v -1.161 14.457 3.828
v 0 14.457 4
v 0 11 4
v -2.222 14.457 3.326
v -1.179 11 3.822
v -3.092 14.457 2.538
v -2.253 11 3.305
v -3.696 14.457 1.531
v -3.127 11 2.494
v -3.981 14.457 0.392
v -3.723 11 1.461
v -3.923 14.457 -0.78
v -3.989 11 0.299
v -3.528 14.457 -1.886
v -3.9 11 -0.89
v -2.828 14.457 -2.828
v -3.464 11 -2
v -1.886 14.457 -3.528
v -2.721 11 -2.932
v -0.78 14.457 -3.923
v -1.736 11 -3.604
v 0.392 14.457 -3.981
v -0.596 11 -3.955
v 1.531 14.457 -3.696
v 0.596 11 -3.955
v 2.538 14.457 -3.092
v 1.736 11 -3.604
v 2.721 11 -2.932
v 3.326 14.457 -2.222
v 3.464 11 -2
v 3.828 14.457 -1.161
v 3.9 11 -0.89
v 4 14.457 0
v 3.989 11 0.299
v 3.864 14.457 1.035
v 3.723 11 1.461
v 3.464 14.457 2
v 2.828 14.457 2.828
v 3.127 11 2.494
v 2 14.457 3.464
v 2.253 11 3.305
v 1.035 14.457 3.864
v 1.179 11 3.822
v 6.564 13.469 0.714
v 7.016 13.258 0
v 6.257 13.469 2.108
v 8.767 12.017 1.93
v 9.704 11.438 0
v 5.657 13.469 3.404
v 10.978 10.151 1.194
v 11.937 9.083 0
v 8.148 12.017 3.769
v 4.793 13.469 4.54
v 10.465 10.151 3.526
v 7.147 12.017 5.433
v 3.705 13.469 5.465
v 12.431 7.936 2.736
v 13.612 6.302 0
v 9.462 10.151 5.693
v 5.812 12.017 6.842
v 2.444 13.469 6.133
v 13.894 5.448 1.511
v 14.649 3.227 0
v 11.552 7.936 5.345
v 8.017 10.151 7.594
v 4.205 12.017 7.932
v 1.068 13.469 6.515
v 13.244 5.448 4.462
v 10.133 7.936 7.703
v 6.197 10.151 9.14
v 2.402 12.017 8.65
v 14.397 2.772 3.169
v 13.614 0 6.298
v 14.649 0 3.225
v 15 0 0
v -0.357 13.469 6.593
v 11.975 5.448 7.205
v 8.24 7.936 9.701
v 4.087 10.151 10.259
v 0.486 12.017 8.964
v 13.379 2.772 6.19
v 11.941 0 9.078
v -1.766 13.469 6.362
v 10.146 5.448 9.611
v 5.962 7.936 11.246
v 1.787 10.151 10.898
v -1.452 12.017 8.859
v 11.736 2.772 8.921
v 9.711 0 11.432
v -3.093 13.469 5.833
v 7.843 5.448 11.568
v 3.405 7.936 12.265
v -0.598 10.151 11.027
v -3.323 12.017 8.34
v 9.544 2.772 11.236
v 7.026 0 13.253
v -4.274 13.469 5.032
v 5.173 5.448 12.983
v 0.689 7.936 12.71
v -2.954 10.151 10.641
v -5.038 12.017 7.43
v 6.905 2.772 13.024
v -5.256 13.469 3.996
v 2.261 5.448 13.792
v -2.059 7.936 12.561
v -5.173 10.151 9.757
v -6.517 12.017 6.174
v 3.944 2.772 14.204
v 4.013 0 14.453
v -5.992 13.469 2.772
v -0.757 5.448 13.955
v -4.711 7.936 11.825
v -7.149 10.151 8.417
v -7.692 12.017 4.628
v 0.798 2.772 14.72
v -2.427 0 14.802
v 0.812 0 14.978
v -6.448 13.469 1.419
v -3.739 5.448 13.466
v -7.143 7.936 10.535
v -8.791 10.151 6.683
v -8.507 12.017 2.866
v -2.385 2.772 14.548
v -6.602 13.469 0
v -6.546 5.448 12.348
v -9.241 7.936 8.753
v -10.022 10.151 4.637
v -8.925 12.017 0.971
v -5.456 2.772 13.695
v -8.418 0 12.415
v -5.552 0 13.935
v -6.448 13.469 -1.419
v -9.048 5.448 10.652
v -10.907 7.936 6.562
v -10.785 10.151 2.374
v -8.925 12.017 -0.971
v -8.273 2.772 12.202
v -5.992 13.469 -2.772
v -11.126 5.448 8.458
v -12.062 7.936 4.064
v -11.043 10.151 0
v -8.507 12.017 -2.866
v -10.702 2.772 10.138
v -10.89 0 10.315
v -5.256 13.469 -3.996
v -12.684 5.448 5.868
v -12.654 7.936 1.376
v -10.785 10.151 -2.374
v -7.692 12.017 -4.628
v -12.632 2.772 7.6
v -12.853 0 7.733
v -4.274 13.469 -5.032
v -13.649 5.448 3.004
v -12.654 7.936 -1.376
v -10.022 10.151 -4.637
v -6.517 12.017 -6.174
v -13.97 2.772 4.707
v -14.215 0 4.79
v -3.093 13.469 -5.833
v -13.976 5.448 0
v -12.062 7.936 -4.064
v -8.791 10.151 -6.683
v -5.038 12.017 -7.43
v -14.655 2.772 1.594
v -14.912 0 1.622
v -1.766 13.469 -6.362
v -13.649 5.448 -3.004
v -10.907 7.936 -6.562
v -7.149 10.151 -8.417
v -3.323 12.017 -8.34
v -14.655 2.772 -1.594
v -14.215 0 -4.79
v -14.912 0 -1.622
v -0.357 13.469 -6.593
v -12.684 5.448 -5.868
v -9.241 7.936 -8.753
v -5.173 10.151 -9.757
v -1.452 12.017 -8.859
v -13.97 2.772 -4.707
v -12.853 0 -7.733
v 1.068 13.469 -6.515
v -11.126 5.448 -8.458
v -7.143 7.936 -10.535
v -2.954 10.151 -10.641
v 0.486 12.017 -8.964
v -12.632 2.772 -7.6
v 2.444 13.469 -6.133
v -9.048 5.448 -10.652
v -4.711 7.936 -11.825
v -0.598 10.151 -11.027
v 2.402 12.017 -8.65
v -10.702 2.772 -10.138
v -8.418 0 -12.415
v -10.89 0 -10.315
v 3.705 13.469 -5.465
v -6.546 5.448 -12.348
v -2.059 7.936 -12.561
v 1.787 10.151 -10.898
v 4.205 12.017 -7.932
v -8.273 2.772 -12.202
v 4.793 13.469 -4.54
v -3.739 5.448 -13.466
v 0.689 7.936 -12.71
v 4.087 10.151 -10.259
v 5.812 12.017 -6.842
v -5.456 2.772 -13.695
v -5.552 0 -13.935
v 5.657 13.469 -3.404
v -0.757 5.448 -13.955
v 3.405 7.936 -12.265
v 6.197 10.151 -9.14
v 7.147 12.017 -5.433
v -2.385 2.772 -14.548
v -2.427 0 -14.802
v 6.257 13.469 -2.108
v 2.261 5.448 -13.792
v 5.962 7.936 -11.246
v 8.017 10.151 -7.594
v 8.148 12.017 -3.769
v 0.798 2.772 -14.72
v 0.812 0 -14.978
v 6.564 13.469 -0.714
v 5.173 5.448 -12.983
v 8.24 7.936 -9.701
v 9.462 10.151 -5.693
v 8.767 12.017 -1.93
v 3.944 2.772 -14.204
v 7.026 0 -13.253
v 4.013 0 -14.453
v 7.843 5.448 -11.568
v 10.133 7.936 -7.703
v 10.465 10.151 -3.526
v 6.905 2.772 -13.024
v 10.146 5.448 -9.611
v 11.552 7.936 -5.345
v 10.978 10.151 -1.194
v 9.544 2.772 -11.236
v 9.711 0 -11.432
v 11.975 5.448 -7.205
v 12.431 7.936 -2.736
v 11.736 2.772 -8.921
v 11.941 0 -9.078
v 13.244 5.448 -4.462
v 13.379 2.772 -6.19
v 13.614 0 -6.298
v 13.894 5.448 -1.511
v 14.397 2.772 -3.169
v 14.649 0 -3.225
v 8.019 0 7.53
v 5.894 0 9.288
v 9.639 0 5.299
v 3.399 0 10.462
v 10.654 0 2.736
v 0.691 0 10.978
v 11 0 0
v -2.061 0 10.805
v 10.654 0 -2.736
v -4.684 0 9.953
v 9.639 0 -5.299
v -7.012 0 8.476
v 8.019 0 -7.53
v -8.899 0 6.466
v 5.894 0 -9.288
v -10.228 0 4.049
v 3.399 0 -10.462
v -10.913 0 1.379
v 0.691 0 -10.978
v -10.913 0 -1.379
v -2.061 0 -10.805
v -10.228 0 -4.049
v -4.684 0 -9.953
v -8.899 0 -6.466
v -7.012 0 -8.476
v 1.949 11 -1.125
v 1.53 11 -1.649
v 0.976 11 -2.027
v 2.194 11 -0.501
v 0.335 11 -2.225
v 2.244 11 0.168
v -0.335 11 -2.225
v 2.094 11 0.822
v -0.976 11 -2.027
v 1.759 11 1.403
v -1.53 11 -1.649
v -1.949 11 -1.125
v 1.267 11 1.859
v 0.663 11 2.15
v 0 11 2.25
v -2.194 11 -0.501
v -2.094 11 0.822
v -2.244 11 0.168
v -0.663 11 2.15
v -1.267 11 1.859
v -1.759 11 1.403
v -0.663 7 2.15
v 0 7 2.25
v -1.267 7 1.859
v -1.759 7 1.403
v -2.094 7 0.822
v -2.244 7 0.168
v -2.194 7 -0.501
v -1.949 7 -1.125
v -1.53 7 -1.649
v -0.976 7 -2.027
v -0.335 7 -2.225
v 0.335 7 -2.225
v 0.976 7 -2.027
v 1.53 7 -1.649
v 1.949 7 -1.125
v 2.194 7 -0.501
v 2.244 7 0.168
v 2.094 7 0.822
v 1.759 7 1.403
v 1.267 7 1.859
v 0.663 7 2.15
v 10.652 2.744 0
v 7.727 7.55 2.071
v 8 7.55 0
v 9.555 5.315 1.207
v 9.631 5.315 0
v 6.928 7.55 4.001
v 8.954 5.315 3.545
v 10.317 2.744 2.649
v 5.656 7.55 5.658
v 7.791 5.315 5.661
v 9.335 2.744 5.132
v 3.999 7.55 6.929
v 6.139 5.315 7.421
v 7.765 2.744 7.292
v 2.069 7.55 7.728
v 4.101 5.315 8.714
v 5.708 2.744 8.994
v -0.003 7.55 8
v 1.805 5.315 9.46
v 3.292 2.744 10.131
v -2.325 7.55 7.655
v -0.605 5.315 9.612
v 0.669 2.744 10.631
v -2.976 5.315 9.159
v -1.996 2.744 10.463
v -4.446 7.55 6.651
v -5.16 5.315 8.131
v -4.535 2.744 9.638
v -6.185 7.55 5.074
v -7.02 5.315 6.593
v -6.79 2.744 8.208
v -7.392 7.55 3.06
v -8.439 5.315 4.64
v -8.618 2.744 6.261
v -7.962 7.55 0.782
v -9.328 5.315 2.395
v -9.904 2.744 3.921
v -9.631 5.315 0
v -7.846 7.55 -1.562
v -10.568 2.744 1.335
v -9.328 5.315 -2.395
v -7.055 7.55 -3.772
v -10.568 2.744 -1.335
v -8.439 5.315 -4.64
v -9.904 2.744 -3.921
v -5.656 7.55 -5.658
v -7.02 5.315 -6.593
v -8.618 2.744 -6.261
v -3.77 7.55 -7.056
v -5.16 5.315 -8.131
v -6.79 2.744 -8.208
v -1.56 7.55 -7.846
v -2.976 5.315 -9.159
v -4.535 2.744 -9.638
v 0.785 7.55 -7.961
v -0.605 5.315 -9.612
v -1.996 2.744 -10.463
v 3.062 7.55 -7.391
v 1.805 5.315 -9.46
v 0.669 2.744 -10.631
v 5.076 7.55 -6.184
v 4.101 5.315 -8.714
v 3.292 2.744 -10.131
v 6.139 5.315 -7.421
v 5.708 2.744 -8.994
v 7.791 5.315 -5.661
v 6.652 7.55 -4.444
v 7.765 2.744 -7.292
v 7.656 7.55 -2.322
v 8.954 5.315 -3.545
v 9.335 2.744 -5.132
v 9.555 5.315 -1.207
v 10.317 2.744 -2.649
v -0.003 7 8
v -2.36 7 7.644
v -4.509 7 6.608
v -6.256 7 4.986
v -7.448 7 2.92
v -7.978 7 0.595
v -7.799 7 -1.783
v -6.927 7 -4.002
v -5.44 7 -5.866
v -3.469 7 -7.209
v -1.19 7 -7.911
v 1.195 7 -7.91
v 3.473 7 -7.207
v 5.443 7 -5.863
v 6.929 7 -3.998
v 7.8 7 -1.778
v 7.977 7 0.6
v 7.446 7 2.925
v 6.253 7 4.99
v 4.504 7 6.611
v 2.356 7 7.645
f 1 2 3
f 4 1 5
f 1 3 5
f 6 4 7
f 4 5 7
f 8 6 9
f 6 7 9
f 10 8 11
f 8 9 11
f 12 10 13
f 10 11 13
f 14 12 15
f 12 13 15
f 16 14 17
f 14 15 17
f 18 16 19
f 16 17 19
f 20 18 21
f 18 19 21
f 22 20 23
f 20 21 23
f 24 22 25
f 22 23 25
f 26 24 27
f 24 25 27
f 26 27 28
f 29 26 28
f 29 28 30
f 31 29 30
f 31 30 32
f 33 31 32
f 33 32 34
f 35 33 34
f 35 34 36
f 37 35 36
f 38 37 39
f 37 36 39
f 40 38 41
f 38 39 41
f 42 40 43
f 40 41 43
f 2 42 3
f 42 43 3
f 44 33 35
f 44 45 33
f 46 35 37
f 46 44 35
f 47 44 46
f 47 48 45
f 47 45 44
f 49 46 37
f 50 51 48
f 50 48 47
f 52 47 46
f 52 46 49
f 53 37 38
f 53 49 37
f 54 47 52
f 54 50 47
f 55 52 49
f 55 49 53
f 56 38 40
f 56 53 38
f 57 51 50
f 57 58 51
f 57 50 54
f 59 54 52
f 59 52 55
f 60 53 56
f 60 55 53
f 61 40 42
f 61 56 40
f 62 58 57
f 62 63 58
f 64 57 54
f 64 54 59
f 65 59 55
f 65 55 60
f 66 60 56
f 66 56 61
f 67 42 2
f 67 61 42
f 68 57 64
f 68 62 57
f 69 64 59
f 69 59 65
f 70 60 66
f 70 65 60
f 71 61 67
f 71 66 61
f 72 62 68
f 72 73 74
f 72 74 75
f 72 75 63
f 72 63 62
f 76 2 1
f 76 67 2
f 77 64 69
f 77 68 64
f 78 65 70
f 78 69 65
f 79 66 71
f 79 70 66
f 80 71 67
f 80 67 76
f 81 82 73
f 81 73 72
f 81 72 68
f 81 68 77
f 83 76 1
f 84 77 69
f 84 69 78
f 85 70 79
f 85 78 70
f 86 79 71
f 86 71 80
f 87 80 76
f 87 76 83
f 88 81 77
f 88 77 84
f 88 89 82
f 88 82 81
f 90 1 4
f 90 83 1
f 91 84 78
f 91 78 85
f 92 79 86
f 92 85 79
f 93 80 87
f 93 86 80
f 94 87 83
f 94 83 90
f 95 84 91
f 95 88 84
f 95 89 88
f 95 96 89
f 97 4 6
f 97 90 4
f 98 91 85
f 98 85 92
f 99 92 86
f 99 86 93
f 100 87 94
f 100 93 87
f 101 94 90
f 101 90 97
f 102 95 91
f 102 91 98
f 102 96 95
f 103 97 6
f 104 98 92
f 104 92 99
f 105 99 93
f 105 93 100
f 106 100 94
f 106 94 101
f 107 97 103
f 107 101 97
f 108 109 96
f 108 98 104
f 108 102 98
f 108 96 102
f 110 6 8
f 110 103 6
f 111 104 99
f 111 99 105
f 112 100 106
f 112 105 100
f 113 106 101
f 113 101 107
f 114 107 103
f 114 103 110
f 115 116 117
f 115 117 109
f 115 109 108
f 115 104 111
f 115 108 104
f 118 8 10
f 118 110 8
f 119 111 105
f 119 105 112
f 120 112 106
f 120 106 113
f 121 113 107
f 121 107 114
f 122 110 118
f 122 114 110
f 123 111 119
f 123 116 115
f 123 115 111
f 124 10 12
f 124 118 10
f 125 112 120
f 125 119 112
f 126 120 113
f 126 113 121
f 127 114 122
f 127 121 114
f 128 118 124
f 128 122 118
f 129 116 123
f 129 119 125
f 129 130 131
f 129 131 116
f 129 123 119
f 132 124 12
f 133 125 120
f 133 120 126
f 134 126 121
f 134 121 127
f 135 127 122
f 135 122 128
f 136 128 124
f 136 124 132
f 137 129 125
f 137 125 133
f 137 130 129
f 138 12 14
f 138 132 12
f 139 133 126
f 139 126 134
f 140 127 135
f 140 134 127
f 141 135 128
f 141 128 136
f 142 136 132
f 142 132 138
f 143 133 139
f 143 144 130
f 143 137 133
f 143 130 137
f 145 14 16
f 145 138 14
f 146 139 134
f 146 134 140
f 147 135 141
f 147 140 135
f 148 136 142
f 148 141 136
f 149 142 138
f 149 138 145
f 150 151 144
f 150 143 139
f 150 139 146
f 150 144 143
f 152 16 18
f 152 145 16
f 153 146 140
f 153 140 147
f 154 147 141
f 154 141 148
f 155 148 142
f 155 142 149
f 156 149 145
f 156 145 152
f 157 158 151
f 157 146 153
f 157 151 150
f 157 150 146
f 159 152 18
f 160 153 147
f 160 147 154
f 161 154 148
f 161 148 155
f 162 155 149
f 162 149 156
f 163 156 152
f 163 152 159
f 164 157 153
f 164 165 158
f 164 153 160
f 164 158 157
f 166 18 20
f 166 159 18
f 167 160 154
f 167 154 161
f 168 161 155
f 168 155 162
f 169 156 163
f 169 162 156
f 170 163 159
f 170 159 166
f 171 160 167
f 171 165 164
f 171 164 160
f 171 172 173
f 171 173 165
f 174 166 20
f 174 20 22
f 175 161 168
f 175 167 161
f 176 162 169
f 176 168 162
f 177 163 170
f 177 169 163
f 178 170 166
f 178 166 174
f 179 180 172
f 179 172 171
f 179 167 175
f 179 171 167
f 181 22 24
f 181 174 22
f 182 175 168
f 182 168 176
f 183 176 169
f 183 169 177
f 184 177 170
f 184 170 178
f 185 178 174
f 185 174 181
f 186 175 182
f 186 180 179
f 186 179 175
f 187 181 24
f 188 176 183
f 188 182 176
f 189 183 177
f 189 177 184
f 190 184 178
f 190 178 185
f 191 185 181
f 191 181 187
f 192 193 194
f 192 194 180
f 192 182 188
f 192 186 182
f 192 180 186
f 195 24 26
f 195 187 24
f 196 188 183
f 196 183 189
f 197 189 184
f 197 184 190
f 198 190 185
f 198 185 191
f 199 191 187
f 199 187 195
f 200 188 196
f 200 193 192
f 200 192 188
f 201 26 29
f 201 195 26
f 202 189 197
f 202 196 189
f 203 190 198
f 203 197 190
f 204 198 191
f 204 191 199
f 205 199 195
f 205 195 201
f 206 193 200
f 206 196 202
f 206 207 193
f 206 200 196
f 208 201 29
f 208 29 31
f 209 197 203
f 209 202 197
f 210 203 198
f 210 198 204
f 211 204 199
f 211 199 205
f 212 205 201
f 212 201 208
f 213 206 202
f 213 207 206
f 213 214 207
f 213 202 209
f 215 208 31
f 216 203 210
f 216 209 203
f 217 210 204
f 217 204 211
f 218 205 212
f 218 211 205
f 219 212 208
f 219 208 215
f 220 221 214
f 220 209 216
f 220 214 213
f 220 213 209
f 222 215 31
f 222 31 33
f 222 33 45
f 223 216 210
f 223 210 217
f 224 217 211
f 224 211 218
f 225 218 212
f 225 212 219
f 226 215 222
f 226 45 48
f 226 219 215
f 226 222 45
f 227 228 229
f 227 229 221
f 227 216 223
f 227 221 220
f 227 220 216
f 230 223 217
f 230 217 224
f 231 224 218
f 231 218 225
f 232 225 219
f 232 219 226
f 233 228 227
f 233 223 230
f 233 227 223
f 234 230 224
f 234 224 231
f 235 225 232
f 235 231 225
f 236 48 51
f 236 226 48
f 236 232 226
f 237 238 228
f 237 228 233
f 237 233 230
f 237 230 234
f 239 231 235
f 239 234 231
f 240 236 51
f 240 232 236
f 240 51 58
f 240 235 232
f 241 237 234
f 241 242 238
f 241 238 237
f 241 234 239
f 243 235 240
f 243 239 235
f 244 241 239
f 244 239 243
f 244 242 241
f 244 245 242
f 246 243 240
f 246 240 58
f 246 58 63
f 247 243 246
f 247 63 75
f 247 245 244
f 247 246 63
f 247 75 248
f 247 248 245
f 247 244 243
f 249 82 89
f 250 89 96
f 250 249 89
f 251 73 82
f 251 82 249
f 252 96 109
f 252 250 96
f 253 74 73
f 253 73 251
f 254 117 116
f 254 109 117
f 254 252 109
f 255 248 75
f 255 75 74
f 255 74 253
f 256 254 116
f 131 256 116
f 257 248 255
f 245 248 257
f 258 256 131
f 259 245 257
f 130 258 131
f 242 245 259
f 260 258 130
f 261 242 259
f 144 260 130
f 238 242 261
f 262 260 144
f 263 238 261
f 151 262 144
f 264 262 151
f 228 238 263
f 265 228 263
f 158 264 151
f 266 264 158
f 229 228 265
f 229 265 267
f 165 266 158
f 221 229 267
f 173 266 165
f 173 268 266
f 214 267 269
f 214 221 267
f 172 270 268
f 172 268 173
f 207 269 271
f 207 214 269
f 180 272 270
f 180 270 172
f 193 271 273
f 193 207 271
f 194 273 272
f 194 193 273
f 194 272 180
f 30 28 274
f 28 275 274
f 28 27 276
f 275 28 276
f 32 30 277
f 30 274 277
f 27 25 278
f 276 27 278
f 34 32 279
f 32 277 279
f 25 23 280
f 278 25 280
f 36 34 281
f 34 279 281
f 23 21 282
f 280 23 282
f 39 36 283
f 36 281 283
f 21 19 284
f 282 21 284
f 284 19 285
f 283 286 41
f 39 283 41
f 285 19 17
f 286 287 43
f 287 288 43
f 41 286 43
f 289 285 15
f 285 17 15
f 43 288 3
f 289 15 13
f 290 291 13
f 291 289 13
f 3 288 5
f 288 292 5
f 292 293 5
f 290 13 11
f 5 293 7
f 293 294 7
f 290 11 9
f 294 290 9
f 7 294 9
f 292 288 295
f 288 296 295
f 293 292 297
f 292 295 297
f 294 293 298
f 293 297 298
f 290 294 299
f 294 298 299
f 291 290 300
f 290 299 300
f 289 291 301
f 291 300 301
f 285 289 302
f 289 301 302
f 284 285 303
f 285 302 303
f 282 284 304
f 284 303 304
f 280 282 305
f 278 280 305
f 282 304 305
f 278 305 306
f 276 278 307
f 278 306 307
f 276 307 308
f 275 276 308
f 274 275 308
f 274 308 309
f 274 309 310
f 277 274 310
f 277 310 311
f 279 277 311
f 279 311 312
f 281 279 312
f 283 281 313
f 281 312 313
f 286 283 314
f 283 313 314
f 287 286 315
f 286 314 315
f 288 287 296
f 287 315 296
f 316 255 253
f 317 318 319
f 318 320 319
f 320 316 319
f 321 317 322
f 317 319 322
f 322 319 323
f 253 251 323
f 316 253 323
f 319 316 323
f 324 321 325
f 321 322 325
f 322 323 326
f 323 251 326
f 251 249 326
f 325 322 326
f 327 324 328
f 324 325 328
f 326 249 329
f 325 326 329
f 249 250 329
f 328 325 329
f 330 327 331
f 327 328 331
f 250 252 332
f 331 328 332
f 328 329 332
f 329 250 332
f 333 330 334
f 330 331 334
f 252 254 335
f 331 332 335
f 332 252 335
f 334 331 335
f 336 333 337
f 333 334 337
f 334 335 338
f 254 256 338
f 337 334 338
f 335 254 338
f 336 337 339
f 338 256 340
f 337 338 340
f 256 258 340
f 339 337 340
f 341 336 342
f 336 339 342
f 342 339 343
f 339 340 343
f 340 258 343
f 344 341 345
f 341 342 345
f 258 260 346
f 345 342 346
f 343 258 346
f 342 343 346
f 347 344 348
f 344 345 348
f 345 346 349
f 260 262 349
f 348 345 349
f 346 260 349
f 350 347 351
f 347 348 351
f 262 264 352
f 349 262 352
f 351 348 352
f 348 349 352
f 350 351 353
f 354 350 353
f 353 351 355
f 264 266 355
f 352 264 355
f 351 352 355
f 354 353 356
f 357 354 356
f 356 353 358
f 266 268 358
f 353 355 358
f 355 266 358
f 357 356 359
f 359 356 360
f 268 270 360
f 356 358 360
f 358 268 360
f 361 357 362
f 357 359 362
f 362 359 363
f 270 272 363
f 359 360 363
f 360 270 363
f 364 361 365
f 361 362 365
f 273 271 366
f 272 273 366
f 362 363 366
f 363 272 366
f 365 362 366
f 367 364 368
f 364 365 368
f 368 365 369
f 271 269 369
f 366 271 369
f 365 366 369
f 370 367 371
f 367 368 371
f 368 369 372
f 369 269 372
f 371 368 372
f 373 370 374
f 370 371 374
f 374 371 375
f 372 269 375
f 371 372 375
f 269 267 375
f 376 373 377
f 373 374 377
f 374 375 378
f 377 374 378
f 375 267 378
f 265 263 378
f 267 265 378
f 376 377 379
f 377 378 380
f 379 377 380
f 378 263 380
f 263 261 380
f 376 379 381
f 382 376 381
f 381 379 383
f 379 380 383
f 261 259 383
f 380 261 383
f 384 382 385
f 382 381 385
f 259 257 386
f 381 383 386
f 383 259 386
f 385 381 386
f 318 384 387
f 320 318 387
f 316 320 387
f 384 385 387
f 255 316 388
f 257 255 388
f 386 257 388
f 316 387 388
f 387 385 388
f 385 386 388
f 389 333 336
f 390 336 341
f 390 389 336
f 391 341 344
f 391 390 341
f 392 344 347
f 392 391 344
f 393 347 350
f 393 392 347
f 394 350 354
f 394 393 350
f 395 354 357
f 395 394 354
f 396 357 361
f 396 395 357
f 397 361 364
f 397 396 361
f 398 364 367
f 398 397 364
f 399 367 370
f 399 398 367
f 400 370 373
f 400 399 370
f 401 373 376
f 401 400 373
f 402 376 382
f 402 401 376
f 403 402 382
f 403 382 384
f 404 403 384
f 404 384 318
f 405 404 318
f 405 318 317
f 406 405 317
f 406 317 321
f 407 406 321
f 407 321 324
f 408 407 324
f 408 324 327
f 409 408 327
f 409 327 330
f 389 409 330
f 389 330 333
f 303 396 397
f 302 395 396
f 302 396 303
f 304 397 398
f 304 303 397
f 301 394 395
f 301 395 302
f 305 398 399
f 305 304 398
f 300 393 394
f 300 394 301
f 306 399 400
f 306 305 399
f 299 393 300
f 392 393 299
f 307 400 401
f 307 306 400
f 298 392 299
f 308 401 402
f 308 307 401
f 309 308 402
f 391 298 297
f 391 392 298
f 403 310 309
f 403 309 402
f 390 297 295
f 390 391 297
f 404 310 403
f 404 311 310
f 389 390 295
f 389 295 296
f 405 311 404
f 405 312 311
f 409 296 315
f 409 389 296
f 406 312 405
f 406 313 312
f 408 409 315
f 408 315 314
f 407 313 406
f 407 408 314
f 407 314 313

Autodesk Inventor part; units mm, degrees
ref_plane "YZ Plane" through (0, 0, 0) normal (1, 0, 0) x (0, 1, 0)
ref_plane "XY Plane" through (0, 0, 0) normal (0, 0, 1) x (1, 0, 0)
sketch "Sketch1" plane through (0, 0, 0) normal (0, 0, 1) x (1, 0, 0)
  line L0 (0, 0) -> (0, 15)
  line L1 (0, 0) -> (15, 0)
  arc A0 (15, 0) -> (0, 15) centre (0, 0) ccw
  line L2 (0, -3.621321) -> (0, 21.727922)
  dimension "d2" = 15
sketch "Sketch1 outline for Revolution1" plane through (0, 0, 0) normal (0, 0, 1) x (1, 0, 0)
  line L0 (0, 0) -> (0, 15)
  arc A0 (0, 15) -> (15, 0) centre (0, 0) cw
  line L1 (15, 0) -> (0, 0)
revolve "Revolution1" add sketch "Sketch1 outline for Revolution1" angle 360 about axis through (0, -10, 0) along (0, 1, 0)
ref_plane "Work Plane1" through (0, 15, 0) normal (0, 1, 0) x (-1, 0, 0)
sketch "Sketch2" plane through (0, 15, 0) normal (0, 1, 0) x (-1, 0, 0)
  point P0 (0, 0)
  point P1 (0, 0)
hole "Hole1" at (0, 15, 0) direction (0, -1, 0) diameter 4.5 end through all counterbore diameter 8 counterbore depth 4 clearance for "Socket Head Cap Screw" size "M4" standard "Ansi Metric M Profile"
shell "Shell1" thickness 4 removed faces 1 at (10.599241, 0, 1.286981)
sketch "Sketch3" plane through (0, 0, 0) normal (0, -1, 0) x (1, 0, 0)
  circle A0 centre (0, 0) radius 6.25 projected
  circle A1 centre (0, 0) radius 2.25 projected
sketch "Sketch3 outline for Extrusion1" plane through (0, 0, 0) normal (0, -1, 0) x (1, 0, 0)
  circle A0 centre (0, 0) radius 6.25
  circle A1 centre (0, 0) radius 2.25
extrude "Extrusion1" cut sketch "Sketch3 outline for Extrusion1" against normal blind 7
properties part number "Ball_Upper Half" material "Nylon 6/6"
